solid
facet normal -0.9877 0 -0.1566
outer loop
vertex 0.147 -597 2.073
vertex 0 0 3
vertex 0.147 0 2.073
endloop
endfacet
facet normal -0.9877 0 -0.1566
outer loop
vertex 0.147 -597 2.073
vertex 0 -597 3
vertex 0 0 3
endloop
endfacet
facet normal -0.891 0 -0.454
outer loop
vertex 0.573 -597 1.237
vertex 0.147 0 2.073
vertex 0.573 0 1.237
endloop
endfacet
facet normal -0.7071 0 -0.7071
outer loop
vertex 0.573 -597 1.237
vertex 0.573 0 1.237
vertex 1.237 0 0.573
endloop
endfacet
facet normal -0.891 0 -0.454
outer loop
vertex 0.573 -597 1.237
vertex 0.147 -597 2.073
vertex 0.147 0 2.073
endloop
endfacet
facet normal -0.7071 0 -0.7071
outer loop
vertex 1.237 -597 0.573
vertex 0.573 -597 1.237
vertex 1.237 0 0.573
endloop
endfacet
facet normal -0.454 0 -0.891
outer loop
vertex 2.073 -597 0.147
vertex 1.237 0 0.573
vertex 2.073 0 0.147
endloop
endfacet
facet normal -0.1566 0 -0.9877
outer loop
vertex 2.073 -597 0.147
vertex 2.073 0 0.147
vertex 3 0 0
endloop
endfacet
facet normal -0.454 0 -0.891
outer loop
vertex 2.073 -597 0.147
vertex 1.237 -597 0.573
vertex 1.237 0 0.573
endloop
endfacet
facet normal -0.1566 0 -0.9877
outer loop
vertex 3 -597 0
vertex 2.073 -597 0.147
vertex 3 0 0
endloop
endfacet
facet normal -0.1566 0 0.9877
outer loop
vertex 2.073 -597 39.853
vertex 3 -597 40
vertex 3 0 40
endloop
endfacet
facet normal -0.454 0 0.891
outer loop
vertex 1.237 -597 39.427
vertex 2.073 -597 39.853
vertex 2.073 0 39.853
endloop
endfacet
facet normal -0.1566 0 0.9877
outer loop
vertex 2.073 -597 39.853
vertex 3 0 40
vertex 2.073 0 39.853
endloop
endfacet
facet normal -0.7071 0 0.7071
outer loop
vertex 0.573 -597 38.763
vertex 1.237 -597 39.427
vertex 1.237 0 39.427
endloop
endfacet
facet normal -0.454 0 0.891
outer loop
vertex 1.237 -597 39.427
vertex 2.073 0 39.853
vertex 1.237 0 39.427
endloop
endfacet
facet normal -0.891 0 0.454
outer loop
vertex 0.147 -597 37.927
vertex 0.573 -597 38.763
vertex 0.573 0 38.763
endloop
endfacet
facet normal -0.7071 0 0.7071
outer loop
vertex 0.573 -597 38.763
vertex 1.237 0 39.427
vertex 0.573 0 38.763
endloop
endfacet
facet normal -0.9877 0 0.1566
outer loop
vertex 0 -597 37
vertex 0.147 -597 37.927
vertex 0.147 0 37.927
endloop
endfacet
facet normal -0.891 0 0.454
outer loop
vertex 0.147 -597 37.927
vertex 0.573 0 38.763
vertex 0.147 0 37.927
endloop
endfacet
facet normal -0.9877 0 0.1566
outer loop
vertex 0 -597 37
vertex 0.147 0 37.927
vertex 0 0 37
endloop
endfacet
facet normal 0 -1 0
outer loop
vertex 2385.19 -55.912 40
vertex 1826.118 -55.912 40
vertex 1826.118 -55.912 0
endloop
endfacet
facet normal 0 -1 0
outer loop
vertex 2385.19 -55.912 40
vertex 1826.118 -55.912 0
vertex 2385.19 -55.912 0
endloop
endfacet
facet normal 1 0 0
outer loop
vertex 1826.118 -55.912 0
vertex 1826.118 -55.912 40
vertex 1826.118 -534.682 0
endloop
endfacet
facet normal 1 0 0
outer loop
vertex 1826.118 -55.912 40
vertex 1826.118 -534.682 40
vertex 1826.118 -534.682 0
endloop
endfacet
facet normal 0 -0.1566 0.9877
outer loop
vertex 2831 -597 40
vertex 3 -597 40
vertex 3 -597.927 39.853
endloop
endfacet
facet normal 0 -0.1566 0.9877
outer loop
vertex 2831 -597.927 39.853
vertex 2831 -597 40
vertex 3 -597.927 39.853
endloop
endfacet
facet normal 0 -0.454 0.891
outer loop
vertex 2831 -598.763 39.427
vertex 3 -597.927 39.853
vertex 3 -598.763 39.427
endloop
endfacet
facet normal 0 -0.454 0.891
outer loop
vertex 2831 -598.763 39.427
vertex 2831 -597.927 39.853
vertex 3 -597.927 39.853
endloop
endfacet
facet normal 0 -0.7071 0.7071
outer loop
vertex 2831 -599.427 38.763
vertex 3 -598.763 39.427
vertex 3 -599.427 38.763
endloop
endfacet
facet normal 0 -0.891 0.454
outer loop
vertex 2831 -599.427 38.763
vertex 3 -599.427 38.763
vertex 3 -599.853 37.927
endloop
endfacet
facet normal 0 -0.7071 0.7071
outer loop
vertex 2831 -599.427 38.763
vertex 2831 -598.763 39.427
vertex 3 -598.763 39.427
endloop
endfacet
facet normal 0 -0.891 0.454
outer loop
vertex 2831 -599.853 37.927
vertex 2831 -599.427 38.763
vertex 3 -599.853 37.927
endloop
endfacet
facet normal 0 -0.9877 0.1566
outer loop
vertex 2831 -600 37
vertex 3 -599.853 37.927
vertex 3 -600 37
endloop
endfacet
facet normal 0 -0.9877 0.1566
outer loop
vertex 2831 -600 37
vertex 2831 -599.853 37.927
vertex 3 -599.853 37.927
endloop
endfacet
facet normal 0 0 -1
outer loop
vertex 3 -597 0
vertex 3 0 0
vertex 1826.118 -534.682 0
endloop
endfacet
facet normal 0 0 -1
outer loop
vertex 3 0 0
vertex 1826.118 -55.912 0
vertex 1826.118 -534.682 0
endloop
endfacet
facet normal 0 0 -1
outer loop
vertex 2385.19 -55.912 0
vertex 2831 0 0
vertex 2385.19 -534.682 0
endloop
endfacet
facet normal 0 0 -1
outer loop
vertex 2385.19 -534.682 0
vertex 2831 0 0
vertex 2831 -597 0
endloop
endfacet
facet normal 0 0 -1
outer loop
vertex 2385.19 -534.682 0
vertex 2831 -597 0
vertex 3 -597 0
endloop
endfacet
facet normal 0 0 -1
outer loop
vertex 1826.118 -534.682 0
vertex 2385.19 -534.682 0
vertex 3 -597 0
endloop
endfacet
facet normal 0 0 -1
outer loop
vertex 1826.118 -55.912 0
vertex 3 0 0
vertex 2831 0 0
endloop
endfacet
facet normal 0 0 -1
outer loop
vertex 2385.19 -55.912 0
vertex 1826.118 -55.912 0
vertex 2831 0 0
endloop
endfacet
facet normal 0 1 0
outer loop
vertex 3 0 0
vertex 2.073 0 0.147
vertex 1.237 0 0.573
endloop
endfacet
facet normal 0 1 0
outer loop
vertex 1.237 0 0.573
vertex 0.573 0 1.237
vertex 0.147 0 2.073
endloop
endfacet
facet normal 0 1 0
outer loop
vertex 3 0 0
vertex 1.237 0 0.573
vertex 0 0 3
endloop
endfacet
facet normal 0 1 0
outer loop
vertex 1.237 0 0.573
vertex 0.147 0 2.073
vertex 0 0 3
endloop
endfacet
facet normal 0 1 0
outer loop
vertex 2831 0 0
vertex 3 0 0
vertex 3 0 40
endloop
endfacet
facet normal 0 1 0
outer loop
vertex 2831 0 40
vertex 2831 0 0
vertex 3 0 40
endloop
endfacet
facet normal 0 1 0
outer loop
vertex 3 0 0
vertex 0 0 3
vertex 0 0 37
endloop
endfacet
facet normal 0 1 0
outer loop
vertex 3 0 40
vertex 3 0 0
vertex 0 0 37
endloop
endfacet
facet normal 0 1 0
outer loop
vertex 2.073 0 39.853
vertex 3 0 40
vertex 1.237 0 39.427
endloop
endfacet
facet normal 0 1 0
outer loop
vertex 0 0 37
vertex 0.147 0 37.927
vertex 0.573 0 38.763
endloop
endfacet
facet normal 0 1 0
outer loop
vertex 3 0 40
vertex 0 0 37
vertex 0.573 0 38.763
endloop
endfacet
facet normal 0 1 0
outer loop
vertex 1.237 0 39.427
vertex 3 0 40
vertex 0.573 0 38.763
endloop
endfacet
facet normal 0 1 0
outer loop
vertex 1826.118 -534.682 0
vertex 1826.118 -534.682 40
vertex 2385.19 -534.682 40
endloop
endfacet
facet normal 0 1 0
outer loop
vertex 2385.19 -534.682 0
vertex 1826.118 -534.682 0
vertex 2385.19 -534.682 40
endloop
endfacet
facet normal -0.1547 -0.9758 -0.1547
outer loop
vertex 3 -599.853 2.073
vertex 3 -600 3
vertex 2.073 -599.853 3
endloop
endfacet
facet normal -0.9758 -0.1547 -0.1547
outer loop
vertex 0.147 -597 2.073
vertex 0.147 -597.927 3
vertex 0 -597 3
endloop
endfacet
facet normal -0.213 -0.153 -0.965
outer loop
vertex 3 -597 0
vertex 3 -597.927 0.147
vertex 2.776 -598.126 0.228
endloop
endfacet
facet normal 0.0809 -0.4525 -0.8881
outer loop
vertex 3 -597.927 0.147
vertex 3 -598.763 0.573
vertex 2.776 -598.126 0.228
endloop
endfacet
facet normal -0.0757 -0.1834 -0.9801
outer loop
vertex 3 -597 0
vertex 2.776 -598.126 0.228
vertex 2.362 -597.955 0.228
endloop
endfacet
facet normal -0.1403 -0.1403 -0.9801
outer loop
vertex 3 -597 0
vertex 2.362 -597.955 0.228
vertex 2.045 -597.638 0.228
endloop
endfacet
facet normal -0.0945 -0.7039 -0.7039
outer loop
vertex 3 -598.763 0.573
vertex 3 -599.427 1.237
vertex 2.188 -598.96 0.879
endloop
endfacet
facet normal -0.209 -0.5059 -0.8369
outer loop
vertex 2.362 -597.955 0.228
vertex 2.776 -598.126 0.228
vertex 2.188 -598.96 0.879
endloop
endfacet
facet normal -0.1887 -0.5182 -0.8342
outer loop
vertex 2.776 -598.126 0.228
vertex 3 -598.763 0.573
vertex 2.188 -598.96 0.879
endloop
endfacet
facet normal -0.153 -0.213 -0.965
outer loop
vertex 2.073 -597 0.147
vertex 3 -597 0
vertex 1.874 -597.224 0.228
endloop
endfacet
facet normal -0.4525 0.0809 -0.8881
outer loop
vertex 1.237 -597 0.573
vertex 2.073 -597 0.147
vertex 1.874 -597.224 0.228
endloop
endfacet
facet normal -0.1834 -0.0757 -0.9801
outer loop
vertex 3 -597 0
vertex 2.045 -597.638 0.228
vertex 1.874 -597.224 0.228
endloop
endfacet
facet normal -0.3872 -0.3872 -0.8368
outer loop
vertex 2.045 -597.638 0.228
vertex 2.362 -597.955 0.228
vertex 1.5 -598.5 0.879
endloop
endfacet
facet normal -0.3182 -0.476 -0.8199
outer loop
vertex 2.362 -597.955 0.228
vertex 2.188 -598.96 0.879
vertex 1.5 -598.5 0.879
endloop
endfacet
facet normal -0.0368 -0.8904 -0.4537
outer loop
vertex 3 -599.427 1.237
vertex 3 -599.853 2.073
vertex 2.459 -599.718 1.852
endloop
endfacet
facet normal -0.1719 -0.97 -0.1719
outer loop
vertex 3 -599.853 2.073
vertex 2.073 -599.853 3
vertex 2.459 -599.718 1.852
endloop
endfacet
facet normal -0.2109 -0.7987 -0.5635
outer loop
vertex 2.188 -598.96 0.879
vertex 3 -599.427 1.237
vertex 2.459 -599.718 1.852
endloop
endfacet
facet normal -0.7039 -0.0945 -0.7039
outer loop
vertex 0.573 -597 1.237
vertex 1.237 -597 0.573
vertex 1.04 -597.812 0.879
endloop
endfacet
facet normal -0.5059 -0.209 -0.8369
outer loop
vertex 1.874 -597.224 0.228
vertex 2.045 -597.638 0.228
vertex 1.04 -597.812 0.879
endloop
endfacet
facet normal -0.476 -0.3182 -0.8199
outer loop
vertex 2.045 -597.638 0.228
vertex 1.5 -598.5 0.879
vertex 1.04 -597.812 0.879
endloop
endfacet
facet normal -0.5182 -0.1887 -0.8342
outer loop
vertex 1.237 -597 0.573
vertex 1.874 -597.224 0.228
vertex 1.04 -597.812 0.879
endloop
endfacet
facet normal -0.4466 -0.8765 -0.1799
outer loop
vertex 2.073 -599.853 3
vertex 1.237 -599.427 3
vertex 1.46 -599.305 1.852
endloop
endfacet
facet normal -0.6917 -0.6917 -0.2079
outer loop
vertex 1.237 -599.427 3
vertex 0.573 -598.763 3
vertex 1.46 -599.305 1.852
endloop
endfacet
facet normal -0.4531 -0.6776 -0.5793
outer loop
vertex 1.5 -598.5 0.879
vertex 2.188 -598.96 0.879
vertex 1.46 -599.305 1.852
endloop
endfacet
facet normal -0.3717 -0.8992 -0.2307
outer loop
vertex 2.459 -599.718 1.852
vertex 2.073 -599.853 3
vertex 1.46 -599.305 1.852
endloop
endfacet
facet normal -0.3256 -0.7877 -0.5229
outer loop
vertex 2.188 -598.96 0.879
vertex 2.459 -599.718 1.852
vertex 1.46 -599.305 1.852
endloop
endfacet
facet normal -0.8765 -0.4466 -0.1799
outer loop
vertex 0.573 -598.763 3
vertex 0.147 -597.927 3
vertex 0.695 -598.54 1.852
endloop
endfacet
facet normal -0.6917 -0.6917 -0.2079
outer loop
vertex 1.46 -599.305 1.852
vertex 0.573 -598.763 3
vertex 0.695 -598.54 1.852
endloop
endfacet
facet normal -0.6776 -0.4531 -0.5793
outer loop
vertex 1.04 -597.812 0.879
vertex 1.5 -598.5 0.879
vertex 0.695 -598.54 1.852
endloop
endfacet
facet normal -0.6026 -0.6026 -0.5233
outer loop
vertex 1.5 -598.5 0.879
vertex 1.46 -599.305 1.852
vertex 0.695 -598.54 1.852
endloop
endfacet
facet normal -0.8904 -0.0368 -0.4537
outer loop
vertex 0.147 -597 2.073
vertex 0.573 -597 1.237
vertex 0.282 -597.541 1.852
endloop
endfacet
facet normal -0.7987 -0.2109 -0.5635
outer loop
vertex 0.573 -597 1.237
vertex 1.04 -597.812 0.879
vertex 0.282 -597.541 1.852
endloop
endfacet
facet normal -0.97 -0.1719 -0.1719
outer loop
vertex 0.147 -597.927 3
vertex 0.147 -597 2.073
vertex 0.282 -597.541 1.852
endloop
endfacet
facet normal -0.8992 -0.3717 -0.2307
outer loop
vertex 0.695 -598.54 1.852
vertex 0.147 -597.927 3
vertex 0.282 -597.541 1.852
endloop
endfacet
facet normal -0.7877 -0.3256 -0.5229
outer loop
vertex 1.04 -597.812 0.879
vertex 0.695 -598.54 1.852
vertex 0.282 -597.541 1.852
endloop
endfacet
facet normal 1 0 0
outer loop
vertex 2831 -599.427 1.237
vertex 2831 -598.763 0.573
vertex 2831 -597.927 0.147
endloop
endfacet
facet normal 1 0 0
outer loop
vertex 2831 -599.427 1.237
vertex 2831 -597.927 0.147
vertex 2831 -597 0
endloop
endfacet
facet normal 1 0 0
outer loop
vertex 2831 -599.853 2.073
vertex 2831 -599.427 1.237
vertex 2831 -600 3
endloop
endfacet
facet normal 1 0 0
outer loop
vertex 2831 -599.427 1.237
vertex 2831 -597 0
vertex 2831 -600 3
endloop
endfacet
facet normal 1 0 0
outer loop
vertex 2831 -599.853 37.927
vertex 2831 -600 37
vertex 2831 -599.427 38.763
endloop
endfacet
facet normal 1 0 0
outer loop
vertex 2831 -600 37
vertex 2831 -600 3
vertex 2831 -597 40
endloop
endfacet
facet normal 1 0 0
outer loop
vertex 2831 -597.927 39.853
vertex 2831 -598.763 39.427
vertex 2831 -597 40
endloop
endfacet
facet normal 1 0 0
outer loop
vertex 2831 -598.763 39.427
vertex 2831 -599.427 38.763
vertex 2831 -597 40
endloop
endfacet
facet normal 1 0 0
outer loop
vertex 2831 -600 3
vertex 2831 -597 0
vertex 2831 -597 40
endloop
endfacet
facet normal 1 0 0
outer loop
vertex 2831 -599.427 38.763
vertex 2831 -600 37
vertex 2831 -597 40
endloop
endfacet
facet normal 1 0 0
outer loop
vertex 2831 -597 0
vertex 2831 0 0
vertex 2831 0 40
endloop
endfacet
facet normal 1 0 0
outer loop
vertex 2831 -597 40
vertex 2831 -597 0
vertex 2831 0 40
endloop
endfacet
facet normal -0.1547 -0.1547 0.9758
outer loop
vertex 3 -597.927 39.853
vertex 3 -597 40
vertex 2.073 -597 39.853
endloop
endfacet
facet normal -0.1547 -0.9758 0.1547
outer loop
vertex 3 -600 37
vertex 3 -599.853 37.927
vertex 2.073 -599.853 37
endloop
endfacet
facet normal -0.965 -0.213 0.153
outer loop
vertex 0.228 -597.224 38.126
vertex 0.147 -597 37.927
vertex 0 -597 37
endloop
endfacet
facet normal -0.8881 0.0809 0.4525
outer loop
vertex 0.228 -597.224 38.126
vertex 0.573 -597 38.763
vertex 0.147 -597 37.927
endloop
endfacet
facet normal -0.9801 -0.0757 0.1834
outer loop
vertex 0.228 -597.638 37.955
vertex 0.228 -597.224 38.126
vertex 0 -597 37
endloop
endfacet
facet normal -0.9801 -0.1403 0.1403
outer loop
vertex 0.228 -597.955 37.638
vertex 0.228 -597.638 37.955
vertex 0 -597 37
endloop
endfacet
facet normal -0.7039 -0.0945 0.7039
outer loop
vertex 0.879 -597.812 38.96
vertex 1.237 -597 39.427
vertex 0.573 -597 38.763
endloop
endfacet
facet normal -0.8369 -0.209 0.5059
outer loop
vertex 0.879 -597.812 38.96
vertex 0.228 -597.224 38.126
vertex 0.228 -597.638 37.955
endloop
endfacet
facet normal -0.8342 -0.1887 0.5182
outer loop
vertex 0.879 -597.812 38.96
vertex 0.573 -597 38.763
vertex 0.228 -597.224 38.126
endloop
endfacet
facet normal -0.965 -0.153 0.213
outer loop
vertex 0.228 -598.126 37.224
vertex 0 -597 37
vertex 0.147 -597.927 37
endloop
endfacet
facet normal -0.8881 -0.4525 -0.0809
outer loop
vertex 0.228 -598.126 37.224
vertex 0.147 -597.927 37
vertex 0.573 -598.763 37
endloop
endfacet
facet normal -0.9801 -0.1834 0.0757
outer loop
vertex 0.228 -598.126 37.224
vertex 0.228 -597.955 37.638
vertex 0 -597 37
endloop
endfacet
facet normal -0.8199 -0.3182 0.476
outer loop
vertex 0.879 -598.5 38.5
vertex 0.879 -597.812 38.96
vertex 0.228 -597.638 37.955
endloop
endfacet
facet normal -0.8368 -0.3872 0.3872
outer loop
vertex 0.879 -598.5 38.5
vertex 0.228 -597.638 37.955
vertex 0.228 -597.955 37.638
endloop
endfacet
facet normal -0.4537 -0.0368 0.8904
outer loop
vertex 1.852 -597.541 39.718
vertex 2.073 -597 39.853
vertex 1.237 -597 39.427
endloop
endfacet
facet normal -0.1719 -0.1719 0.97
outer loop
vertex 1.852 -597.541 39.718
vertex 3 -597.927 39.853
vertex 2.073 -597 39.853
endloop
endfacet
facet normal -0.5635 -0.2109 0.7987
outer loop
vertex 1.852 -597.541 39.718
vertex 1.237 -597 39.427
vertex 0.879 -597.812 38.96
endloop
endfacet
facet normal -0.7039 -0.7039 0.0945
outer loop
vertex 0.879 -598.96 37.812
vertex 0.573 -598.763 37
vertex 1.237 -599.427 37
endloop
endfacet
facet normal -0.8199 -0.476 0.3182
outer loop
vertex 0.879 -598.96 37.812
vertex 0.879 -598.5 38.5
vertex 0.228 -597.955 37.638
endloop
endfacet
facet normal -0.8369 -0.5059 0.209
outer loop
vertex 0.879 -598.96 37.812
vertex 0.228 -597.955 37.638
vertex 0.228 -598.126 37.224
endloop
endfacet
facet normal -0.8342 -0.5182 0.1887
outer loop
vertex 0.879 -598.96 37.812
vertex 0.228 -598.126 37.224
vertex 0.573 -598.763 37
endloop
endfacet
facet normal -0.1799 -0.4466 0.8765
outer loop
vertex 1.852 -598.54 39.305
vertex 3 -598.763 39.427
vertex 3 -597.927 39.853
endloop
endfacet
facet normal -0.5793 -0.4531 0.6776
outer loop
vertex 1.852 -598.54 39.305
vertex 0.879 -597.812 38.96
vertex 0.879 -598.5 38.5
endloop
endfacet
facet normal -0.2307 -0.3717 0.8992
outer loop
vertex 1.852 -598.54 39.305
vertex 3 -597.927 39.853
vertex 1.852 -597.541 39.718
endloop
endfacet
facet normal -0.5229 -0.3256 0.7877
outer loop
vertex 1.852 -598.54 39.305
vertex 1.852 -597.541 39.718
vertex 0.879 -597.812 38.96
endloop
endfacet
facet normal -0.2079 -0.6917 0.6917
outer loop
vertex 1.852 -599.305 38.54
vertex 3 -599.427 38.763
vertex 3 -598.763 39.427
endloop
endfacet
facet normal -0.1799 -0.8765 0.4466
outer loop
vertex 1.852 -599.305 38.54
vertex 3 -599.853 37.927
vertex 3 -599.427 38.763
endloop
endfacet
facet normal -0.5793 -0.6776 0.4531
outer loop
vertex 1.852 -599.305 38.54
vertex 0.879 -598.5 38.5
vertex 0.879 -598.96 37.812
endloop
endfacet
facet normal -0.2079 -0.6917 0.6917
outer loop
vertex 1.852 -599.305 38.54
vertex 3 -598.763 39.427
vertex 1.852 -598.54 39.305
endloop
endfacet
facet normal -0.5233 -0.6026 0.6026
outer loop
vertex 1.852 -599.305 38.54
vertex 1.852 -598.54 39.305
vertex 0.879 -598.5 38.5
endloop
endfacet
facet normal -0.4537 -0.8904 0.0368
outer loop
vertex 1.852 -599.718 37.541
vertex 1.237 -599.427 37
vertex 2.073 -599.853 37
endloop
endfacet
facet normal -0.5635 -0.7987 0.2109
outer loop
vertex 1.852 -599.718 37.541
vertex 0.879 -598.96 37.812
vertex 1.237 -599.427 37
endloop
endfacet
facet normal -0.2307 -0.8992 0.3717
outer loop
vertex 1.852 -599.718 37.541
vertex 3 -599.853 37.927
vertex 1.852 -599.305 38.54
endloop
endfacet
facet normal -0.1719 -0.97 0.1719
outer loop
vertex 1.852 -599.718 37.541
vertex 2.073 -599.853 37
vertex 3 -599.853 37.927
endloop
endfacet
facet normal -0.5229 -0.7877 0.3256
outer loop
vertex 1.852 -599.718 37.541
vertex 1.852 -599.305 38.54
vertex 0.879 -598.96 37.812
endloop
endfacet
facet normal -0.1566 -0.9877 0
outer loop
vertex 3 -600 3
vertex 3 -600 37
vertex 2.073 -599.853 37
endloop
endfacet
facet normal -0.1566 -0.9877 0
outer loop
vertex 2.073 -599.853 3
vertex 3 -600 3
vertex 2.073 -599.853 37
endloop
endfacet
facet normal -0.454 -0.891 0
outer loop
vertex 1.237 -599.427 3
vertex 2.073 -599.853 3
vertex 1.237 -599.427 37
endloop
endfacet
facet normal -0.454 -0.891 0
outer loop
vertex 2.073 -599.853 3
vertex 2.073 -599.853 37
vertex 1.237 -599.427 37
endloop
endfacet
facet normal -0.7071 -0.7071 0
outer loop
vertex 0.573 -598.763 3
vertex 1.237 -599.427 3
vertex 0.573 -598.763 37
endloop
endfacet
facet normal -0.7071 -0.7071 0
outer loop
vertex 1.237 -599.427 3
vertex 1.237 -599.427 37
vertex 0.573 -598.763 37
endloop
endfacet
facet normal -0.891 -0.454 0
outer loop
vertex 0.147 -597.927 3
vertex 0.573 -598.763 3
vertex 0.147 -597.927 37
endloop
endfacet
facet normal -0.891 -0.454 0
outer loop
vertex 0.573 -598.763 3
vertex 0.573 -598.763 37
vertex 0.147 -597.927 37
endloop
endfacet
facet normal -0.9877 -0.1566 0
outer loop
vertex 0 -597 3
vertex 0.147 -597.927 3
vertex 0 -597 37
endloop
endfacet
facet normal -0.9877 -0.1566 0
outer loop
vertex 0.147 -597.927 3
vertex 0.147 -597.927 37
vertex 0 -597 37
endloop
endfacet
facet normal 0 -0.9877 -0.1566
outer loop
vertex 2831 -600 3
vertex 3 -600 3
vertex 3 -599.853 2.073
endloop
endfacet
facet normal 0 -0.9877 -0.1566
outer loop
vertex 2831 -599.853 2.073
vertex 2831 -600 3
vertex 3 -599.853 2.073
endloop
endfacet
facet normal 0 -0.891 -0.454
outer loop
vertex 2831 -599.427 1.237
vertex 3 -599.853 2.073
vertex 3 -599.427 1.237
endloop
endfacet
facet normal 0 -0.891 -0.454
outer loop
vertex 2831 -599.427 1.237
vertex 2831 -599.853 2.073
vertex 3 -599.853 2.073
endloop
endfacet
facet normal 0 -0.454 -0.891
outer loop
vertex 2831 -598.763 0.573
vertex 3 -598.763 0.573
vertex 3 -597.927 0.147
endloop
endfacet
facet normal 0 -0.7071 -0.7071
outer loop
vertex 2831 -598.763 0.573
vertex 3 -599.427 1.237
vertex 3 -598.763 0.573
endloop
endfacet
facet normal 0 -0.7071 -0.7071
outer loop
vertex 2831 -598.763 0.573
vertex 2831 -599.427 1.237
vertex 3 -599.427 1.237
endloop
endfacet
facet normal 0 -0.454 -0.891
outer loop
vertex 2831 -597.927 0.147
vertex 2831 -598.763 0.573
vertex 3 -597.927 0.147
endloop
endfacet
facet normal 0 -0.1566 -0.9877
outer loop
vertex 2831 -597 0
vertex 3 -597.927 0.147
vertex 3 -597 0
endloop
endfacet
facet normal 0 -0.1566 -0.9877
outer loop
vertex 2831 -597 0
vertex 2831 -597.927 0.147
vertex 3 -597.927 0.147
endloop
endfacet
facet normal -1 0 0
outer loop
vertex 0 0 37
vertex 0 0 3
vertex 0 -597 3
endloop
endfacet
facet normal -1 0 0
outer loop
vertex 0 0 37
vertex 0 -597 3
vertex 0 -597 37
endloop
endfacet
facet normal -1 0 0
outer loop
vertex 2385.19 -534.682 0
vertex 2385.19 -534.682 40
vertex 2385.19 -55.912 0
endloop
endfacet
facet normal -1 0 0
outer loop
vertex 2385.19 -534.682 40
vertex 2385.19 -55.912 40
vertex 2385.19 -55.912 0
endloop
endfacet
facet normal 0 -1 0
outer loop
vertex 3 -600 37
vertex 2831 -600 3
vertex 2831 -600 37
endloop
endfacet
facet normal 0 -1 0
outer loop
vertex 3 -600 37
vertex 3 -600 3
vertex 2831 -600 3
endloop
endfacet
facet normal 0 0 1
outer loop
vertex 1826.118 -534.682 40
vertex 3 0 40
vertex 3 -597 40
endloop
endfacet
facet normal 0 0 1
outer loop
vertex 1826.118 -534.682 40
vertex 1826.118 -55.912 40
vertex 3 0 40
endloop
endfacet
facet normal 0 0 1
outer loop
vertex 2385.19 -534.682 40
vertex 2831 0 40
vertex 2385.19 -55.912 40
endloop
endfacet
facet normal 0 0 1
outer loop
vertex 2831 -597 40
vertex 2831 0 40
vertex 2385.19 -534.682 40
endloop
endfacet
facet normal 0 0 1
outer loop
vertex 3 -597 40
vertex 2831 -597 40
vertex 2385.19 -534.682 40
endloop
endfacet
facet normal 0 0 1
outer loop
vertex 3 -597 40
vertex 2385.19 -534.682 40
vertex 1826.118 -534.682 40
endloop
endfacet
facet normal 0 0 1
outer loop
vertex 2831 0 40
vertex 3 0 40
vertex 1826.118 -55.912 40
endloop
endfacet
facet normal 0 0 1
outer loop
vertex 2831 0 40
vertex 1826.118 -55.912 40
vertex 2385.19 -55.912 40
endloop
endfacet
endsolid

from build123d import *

# Parameters (mm, degrees)
F0_W      = 45.2956259251
F0_H      = 35.350099206
F1_DEPTH  = 40
F2_DEPTH  = 2900
F3_DEPTH  = 600
F4_DEPTH  = 2850
F5_DEPTH  = 50
F6_DEPTH  = 25
F7_DEPTH  = 10
F8_DEPTH  = 5
F9_DEPTH  = 2
F10_DEPTH = 1
F11_R     = 3
F12_W     = 559.0722560883
F12_H     = 383.7698698044
F13_DEPTH = 40
F14_DEPTH = 40
F15_DEPTH = 25
F16_DEPTH = 30
F17_DEPTH = 400
F18_DEPTH = 60
F19_DEPTH = 40
F20_DEPTH = 250
F21_DEPTH = 50


with BuildPart() as f1:
    # F0 (on Top) → F1 (new body)
    with BuildSketch(Plane.XY):
        with Locations((22.6478129625, -17.675049603)):
            Rectangle(F0_W, F0_H)
    extrude(amount=F1_DEPTH)

    # F2 (add): a face of the model
    f2_faces = [f1.faces().sort_by_distance(p)[0] for p in [
        (0, -17.675049603, 20),
    ]]
    extrude(f2_faces, amount=-F2_DEPTH)

    # F3 (add): a face of the model
    f3_faces = [f1.faces().sort_by_distance(p)[0] for p in [
        (1450, 0, 20),
    ]]
    extrude(f3_faces, amount=-F3_DEPTH)

    # F4 (add): a face of the model
    f4_faces = [f1.faces().sort_by_distance(p)[0] for p in [
        (0, -300, 20),
    ]]
    extrude(f4_faces, amount=-F4_DEPTH)

    # F5 (cut): a face of the model
    f5_faces = [f1.faces().sort_by_distance(p)[0] for p in [
        (2900, -300, 20),
    ]]
    extrude(f5_faces, amount=-F5_DEPTH, mode=Mode.SUBTRACT)

    # F6 (cut): a face of the model
    f6_faces = [f1.faces().sort_by_distance(p)[0] for p in [
        (2850, -300, 20),
    ]]
    extrude(f6_faces, amount=-F6_DEPTH, mode=Mode.SUBTRACT)

    # F7 (add): a face of the model
    f7_faces = [f1.faces().sort_by_distance(p)[0] for p in [
        (2825, -300, 20),
    ]]
    extrude(f7_faces, amount=F7_DEPTH)

    # F8 (cut): a face of the model
    f8_faces = [f1.faces().sort_by_distance(p)[0] for p in [
        (2835, -300, 20),
    ]]
    extrude(f8_faces, amount=-F8_DEPTH, mode=Mode.SUBTRACT)

    # F9 (add): a face of the model
    f9_faces = [f1.faces().sort_by_distance(p)[0] for p in [
        (2830, -300, 20),
    ]]
    extrude(f9_faces, amount=F9_DEPTH)

    # F10 (cut): a face of the model
    f10_faces = [f1.faces().sort_by_distance(p)[0] for p in [
        (2832, -300, 20),
    ]]
    extrude(f10_faces, amount=-F10_DEPTH, mode=Mode.SUBTRACT)

    # F11
    f11_edges = [f1.edges().sort_by_distance(p)[0] for p in [
        (1415.5, -600, 40),
        (0, -300, 40),
        (0, -600, 20),
        (1415.5, -600, 0),
        (0, -300, 0),
    ]]
    fillet(f11_edges, radius=F11_R)

    # F12 (on face) → F13 (cut)
    with BuildSketch(Plane.XY.offset(40)):
        with Locations((2405.6543111801, -302.7966022491)):
            Rectangle(F12_W, F12_H)
    extrude(amount=-F13_DEPTH, mode=Mode.SUBTRACT)

    # F14 (cut): a face of the model
    f14_faces = [f1.faces().sort_by_distance(p)[0] for p in [
        (2405.6543111801, -494.6815371513, 20),
    ]]
    extrude(f14_faces, amount=-F14_DEPTH, mode=Mode.SUBTRACT)

    # F15 (cut): a face of the model
    f15_faces = [f1.faces().sort_by_distance(p)[0] for p in [
        (2405.6543111801, -110.911667347, 20),
    ]]
    extrude(f15_faces, amount=-F15_DEPTH, mode=Mode.SUBTRACT)

    # F16 (cut): a face of the model
    f16_faces = [f1.faces().sort_by_distance(p)[0] for p in [
        (2405.6543111801, -85.911667347, 20),
    ]]
    extrude(f16_faces, amount=-F16_DEPTH, mode=Mode.SUBTRACT)

    # F17 (cut): a face of the model
    f17_faces = [f1.faces().sort_by_distance(p)[0] for p in [
        (2126.118183136, -295.2966022491, 20),
    ]]
    extrude(f17_faces, amount=-F17_DEPTH, mode=Mode.SUBTRACT)

    # F18 (add): a face of the model
    f18_faces = [f1.faces().sort_by_distance(p)[0] for p in [
        (1726.118183136, -295.2966022491, 20),
    ]]
    extrude(f18_faces, amount=F18_DEPTH)

    # F19 (add): a face of the model
    f19_faces = [f1.faces().sort_by_distance(p)[0] for p in [
        (1786.118183136, -295.2966022491, 20),
    ]]
    extrude(f19_faces, amount=F19_DEPTH)

    # F20 (add): a face of the model
    f20_faces = [f1.faces().sort_by_distance(p)[0] for p in [
        (2685.1904392242, -295.2966022491, 20),
    ]]
    extrude(f20_faces, amount=F20_DEPTH)

    # F21 (add): a face of the model
    f21_faces = [f1.faces().sort_by_distance(p)[0] for p in [
        (2435.1904392242, -295.2966022491, 20),
    ]]
    extrude(f21_faces, amount=F21_DEPTH)


solid = f1.part
